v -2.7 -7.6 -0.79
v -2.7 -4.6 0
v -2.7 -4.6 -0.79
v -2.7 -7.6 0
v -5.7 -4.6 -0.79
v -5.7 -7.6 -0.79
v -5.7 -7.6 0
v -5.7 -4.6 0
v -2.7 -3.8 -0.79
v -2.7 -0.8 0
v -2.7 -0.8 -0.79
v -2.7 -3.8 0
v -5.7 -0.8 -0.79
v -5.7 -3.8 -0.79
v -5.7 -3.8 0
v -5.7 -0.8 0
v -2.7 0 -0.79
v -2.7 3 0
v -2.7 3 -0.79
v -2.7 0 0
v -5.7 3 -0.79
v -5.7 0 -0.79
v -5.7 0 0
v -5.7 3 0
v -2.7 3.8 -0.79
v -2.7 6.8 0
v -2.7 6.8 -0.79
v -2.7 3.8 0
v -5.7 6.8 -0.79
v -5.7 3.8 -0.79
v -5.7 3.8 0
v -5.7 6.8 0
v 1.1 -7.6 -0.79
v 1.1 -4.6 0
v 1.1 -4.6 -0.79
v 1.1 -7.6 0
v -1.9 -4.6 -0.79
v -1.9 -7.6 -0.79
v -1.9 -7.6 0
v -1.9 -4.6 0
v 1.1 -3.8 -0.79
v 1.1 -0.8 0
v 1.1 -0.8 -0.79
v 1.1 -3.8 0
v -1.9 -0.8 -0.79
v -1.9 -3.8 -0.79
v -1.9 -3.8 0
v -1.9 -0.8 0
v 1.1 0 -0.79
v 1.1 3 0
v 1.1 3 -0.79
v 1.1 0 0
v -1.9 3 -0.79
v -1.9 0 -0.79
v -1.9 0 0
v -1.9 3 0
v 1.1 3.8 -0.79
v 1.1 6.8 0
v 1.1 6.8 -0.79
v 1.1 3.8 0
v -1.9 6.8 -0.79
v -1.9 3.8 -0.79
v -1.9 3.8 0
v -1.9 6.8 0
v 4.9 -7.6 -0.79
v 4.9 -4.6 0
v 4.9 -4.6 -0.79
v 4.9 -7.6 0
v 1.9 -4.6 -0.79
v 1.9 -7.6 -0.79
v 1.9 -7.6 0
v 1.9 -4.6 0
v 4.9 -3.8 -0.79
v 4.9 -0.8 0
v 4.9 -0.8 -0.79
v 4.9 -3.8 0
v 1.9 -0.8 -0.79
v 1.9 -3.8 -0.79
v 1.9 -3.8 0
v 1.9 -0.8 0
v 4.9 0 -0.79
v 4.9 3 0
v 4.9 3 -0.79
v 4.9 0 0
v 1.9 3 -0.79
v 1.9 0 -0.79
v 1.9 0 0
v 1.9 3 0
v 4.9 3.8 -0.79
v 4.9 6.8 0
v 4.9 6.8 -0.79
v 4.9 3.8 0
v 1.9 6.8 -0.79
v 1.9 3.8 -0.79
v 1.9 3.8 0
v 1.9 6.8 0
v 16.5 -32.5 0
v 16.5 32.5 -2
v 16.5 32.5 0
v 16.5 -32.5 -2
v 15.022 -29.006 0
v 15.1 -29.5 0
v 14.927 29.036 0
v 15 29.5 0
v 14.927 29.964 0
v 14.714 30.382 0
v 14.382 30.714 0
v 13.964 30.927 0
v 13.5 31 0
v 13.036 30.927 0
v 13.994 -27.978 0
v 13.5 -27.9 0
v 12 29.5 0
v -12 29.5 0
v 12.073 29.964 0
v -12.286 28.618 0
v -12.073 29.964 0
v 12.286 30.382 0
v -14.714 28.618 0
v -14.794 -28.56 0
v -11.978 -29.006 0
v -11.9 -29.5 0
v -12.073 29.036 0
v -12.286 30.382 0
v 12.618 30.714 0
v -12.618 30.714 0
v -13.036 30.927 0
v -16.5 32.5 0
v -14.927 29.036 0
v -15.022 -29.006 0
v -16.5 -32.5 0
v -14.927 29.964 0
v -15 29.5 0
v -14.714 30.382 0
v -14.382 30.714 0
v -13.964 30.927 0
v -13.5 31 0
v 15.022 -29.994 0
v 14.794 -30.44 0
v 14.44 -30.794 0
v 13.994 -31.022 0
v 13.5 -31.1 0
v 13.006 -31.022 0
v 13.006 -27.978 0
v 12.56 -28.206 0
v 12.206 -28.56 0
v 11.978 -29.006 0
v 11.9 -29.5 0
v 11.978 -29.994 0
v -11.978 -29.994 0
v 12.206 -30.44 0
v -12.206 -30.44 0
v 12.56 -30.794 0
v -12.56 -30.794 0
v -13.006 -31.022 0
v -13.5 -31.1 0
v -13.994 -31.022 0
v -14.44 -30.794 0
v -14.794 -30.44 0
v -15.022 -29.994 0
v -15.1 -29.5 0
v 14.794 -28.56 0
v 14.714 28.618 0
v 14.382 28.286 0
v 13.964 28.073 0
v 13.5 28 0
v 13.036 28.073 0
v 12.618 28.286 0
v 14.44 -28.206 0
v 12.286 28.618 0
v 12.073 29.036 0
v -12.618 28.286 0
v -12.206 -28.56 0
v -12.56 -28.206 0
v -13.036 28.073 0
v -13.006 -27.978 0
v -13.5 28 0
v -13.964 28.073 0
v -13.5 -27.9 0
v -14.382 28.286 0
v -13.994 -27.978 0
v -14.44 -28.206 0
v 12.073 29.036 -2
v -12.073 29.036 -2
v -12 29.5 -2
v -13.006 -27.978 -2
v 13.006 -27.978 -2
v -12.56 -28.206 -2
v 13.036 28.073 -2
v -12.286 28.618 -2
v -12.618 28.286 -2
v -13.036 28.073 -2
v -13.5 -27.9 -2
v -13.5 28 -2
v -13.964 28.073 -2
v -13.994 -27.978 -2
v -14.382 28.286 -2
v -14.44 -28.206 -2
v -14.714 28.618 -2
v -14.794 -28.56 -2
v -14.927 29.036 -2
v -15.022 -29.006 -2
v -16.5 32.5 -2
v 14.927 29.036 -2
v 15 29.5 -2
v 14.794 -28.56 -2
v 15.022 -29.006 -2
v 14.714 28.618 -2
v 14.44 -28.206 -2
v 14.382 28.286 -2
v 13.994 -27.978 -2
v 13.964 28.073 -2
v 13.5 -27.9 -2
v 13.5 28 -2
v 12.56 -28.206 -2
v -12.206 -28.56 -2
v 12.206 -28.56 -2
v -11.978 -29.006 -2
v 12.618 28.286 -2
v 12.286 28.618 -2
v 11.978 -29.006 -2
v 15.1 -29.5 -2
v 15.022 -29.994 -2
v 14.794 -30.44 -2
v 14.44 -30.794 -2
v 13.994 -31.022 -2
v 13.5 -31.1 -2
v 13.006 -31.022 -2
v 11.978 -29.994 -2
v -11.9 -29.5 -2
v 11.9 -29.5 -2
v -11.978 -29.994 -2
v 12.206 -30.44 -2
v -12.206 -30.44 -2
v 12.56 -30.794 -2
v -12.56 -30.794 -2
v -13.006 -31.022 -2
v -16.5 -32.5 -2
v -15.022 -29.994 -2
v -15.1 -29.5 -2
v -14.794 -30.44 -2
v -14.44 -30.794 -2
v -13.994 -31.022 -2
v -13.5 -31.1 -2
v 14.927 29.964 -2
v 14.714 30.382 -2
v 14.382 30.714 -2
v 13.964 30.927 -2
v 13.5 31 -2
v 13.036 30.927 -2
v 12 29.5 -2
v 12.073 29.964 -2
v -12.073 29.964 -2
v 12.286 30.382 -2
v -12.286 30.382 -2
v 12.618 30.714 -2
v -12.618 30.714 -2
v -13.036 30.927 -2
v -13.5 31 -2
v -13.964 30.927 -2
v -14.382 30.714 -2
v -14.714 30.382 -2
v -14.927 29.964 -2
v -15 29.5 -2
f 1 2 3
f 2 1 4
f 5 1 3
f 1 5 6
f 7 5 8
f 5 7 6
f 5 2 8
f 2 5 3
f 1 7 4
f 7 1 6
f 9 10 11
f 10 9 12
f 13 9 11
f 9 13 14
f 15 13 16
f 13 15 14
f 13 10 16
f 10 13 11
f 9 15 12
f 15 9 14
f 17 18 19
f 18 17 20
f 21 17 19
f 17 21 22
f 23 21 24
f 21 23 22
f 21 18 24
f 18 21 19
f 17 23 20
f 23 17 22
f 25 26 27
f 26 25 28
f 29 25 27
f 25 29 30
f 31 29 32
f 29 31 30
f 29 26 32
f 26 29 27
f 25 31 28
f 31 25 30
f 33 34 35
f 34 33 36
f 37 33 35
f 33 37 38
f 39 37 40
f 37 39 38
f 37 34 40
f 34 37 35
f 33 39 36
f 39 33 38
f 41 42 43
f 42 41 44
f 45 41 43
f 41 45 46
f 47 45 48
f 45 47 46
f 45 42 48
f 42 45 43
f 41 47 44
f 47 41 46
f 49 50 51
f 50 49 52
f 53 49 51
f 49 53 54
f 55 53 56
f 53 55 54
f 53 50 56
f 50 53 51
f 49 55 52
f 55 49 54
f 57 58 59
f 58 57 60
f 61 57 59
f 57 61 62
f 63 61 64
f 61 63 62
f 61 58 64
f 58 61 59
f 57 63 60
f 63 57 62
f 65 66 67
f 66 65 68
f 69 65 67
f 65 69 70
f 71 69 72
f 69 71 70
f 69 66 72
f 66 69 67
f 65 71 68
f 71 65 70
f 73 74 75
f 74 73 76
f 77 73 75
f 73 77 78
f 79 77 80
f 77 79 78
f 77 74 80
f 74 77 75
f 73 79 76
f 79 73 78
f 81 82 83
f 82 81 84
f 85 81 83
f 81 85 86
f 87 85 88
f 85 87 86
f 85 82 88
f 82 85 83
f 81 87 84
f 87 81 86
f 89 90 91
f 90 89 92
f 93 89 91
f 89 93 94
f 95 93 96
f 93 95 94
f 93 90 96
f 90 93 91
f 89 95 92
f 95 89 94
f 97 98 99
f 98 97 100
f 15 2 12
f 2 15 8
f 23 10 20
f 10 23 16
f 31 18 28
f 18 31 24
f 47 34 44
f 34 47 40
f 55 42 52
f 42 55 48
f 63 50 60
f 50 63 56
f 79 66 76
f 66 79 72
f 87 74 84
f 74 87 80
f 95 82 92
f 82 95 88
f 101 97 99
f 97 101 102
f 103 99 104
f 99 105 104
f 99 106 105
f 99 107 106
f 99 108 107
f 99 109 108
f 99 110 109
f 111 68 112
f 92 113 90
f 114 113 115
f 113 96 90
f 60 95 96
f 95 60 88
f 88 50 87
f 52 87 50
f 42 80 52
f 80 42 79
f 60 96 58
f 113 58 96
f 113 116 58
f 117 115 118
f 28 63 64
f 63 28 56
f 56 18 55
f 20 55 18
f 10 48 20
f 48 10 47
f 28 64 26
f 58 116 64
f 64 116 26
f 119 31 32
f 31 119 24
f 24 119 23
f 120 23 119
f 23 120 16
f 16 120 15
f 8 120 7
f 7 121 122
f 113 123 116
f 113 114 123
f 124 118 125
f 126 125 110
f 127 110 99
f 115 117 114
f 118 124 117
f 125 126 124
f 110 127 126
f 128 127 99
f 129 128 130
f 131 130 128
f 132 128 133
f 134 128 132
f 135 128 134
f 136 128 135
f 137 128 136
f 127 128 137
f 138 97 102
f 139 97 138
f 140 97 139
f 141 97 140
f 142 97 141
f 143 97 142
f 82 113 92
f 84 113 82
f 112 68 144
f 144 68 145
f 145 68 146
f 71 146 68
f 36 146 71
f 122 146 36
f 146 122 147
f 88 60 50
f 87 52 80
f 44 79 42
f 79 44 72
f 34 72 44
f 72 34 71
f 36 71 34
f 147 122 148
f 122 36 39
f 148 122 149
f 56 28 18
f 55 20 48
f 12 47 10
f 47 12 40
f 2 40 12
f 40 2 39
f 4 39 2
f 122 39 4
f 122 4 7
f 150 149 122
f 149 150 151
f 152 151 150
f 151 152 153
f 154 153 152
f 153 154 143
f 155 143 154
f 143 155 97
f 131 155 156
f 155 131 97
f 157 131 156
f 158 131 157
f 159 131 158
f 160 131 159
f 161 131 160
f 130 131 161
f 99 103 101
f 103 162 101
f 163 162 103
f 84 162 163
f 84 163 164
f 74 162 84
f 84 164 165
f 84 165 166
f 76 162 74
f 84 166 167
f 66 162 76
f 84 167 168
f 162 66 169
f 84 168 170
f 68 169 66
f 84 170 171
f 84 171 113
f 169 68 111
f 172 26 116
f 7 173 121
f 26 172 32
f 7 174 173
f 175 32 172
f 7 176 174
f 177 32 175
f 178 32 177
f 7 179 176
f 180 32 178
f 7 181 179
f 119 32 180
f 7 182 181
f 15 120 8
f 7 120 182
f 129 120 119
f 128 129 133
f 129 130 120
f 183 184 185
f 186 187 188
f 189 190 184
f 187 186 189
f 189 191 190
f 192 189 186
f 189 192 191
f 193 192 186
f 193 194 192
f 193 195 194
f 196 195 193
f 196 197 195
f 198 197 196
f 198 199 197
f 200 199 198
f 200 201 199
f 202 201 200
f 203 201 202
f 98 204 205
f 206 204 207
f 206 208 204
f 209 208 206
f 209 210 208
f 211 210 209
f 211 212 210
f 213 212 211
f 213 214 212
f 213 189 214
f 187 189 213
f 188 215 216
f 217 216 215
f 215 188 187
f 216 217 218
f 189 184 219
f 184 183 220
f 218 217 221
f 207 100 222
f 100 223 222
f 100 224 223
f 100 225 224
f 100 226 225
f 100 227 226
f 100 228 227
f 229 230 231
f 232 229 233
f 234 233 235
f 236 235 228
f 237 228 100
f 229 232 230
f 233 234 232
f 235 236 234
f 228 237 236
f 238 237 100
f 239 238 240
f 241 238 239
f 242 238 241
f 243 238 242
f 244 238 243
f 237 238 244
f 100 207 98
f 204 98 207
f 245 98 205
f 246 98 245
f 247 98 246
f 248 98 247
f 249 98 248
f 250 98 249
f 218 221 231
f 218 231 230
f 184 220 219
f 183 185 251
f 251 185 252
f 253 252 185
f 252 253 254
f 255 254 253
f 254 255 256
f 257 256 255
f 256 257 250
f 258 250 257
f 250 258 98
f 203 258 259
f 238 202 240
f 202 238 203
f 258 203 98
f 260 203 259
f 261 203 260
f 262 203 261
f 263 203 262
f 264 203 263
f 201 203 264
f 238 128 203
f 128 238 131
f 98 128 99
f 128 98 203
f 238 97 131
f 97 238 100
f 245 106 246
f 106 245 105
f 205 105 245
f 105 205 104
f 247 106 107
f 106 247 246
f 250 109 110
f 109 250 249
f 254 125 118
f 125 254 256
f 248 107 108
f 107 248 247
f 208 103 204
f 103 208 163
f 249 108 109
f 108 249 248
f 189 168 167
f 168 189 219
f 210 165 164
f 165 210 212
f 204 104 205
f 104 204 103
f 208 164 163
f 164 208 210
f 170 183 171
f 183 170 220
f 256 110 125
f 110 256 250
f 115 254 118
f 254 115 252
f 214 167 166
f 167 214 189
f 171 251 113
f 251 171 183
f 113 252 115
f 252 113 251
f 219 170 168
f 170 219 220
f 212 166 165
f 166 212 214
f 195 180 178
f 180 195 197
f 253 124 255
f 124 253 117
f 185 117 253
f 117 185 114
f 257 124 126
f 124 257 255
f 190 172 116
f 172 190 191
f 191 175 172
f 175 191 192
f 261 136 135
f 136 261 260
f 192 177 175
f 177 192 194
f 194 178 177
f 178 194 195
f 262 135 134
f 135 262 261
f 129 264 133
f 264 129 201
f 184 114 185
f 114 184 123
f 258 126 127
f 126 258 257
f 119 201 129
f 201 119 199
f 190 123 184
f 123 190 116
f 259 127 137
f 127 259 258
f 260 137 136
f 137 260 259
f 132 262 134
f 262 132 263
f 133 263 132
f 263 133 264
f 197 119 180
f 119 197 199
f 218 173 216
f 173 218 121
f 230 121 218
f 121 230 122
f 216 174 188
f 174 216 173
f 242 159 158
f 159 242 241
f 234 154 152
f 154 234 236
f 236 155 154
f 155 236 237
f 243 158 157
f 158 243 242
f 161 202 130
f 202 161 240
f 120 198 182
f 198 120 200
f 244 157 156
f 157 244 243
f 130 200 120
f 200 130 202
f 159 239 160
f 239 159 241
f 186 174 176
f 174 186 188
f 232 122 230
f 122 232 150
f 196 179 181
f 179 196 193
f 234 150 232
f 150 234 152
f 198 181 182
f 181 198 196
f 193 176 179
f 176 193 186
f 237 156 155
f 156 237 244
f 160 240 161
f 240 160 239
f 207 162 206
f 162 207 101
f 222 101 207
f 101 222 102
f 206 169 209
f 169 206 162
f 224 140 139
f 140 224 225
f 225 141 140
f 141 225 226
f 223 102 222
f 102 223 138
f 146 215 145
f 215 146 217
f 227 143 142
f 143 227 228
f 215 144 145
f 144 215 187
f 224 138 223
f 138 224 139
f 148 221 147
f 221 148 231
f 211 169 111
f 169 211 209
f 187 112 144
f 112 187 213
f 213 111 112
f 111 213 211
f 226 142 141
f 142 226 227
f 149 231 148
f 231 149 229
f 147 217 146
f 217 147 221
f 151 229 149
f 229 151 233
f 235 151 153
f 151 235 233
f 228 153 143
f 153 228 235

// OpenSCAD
//oocyte chamber
//updated by AM Chagas 20210506 -> larger grid
//designed by AM Chagas 20181001 CC BY 4.0 license
//inspired on the design from J Menzies.

wellx = 3;
welly = 3;
wellz = 0.8;
interwell = 0.8;
nwellsx = 3;
nwellsy = 4;

platey = wellx*nwellsx*5+20;
platex = welly*nwellsy*1.5+15;
platez = 2;

screwD = 3;
screwH = 10;

legL=40;
legD=8;


tol = 0.1;
$fn=20;
module grid(){
    for (x = [0:nwellsx-1]){
        for (y = [0:nwellsy-1]){
            translate([x*(wellx+interwell),y*(welly+interwell),0]){
                cube([wellx,welly,wellz]);
                }//end translate
            }//end for y
    }//end for x
}//end module

module plate(){
difference(){
translate([0,0,-platez/2]){
cube([platex,platey,platez],center=true);
}//end translate
translate([-(nwellsx*(wellx+interwell))/2,-(nwellsy*(welly+interwell))/2,-wellz+0.01]){
grid();
}//end translate
}//end difference

}//end module

module grid_w_holes(){
difference(){
plate();

translate([platex/2-screwD,platey/2-screwD,-screwH/2])
cylinder(d=screwD,h=screwH);

translate([-platex/2+screwD,platey/2-screwD,-screwH/2])
cylinder(d=3,h=screwH);

translate([-platex/2+screwD,-platey/2+screwD,-screwH/2])
cylinder(d=screwD+2*tol,h=screwH);

translate([platex/2-screwD,-platey/2+screwD,-screwH/2])
cylinder(d=screwD+2*tol,h=screwH);

}//end difference


}//end module

module grid_w_legs(){
    plate();
    
    translate([platex/2-legD,platey/2-legD,-legL])
cube([legD,legD,legL]);

translate([-platex/2,platey/2-legD,-legL])
cube([legD,legD,legL]);

translate([-platex/2,-platey/2,-legL])
cube([legD,legD,legL]);

translate([platex/2-legD,-platey/2,-legL])
cube([legD,legD,legL]);
    
    }

//grid_w_legs();
grid_w_holes();
